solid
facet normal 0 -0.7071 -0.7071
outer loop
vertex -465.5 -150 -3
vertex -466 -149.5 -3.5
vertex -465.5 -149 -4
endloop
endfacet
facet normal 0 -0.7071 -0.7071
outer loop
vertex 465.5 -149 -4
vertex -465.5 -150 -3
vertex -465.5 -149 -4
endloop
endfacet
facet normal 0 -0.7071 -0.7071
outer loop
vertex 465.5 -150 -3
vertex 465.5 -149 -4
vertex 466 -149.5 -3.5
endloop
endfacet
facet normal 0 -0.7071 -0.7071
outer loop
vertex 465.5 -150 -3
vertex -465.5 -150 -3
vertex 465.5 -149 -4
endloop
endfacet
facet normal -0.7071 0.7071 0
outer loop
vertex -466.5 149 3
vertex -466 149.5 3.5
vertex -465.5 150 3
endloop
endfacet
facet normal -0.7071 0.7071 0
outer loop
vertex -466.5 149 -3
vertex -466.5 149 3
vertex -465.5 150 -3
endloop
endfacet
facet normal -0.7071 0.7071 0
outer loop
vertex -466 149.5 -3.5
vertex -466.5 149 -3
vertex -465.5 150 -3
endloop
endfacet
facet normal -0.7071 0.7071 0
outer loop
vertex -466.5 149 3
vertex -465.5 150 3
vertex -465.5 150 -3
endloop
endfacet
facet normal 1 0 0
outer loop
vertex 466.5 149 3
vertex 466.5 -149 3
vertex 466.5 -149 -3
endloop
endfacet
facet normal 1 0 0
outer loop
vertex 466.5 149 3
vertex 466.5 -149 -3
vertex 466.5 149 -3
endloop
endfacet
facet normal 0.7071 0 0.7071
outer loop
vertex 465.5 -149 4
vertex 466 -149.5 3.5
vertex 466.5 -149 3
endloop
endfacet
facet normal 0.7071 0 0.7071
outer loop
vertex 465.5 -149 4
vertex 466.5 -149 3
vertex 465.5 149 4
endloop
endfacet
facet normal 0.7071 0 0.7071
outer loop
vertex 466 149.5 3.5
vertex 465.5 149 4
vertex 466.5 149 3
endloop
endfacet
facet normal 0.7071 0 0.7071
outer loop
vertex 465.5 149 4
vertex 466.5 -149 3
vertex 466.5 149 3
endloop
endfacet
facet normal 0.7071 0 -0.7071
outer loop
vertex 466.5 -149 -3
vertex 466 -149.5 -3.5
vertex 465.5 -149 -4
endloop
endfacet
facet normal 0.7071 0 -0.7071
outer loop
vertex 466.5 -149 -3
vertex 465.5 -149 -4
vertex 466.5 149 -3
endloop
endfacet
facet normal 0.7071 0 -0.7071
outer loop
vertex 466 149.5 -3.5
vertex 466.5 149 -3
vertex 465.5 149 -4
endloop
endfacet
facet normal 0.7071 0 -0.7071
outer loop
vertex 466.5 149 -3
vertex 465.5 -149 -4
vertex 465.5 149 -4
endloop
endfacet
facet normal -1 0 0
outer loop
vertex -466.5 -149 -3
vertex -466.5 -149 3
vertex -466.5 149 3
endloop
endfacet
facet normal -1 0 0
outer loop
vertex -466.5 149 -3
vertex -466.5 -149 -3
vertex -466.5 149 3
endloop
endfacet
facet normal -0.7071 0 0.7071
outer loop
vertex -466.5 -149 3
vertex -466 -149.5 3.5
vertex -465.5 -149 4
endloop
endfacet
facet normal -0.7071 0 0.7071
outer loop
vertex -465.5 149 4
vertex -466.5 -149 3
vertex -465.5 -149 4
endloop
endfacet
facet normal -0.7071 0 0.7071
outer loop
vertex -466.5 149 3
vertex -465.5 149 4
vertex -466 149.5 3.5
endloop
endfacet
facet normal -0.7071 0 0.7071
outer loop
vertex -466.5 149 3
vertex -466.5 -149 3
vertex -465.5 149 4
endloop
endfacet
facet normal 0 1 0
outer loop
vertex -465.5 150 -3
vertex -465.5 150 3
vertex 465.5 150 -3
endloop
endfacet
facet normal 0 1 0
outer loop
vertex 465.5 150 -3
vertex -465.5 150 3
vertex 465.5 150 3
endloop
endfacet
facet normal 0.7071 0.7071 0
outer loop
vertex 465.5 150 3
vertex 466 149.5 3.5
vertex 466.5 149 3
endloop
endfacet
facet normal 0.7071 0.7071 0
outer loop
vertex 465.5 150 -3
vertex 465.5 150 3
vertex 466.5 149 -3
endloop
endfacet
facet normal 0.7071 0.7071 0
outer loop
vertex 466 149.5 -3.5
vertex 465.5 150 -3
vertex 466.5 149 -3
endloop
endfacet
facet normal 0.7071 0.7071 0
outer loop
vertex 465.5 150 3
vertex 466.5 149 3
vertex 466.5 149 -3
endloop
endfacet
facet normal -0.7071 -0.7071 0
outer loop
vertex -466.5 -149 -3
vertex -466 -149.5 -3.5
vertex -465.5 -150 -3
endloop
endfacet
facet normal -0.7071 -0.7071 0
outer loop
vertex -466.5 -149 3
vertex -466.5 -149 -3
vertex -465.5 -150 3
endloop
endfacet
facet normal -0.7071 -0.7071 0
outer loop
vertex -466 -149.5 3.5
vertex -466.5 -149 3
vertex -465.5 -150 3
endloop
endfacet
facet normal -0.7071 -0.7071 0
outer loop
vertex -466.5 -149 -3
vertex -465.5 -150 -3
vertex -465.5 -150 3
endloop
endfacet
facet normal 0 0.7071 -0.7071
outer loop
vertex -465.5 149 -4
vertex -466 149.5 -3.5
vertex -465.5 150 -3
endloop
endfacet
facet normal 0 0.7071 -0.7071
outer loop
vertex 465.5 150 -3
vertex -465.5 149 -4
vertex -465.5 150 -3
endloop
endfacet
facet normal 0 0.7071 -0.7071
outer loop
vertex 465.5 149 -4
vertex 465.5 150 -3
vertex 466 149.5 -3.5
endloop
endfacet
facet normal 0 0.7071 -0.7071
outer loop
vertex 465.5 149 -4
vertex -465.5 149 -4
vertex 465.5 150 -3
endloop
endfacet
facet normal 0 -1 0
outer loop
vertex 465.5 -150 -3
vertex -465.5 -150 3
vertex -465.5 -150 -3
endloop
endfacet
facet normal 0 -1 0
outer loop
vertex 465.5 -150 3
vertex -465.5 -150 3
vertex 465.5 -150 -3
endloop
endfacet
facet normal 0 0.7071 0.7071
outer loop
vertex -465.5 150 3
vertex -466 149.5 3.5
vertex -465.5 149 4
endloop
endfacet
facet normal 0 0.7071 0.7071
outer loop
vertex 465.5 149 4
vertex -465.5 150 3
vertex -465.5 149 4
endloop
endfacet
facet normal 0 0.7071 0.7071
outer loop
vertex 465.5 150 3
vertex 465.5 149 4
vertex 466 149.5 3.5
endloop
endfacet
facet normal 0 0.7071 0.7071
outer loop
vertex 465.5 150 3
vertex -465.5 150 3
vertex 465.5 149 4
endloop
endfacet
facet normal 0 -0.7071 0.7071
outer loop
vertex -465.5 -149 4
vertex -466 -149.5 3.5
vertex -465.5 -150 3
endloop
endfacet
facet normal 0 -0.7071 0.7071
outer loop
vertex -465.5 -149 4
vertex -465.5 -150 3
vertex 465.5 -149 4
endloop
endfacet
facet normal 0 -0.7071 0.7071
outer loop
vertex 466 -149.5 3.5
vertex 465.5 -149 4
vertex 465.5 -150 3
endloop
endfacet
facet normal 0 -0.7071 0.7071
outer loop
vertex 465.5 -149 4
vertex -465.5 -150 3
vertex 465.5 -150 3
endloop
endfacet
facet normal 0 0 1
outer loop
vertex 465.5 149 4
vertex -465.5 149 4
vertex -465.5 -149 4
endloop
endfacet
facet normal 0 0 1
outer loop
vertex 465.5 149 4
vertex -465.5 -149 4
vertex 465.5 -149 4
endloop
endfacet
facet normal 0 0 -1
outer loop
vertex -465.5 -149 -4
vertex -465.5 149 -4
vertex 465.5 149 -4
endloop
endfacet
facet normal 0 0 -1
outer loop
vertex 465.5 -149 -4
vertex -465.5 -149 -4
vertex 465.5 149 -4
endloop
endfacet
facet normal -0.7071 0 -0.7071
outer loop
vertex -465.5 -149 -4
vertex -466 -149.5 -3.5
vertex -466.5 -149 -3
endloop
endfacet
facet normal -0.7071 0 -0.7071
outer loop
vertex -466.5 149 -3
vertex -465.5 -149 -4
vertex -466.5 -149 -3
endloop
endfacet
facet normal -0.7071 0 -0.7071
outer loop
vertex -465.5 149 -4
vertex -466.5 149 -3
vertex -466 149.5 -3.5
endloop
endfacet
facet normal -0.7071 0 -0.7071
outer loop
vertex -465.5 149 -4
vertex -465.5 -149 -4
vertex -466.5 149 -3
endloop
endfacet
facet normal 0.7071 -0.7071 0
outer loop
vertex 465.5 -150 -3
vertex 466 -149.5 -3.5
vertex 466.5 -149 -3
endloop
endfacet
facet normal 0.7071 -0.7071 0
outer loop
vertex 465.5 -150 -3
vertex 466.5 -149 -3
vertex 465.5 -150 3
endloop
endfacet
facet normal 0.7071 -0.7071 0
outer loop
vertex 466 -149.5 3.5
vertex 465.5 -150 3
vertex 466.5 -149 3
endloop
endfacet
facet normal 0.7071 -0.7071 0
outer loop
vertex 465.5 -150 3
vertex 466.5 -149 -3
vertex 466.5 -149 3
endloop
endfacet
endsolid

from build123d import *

# Parameters (mm, degrees)
F0_W     = 933
F0_H     = 300
F1_DEPTH = 4
F2_SIZE  = 1
F3_SIZE  = 1
F4_SIZE  = 1
F5_SIZE  = 1
F6_SIZE  = 1
F7_SIZE  = 1


with BuildPart() as f1:
    # F0 (on Top) → F1 (new body, symmetric)
    with BuildSketch(Plane.XY):
        Rectangle(F0_W, F0_H)
    extrude(amount=F1_DEPTH, both=True)

    # F2
    f2_edges = [f1.edges().sort_by_distance(p)[0] for p in [
        (466.5, 0, -4),
        (0, -150, -4),
        (-466.5, 0, -4),
        (0, 150, -4),
    ]]
    chamfer(f2_edges, length=F2_SIZE)

    # F3
    f3_edges = [f1.edges().sort_by_distance(p)[0] for p in [
        (466.5, -150, 0.5),
    ]]
    chamfer(f3_edges, length=F3_SIZE)

    # F4
    f4_edges = [f1.edges().sort_by_distance(p)[0] for p in [
        (-466.5, 150, 0.5),
    ]]
    chamfer(f4_edges, length=F4_SIZE)

    # F5
    f5_edges = [f1.edges().sort_by_distance(p)[0] for p in [
        (-466.5, -150, 0.5),
    ]]
    chamfer(f5_edges, length=F5_SIZE)

    # F6
    f6_edges = [f1.edges().sort_by_distance(p)[0] for p in [
        (466.5, 150, 0.5),
    ]]
    chamfer(f6_edges, length=F6_SIZE)

    # F7 (call 1 of 4: OpenCascade refuses the feature's edges together)
    f7_edges = [f1.edges().sort_by_distance(p)[0] for p in [
        (0, -150, 4),
    ]]
    chamfer(f7_edges, length=F7_SIZE)

    # F7#2 (call 2 of 4)
    f7_2_edges = [f1.edges().sort_by_distance(p)[0] for p in [
        (466.5, 0, 4),
    ]]
    chamfer(f7_2_edges, length=F7_SIZE)

    # F7#3 (call 3 of 4)
    f7_3_edges = [f1.edges().sort_by_distance(p)[0] for p in [
        (0, 150, 4),
    ]]
    chamfer(f7_3_edges, length=F7_SIZE)

    # F7#4 (call 4 of 4)
    f7_4_edges = [f1.edges().sort_by_distance(p)[0] for p in [
        (-466.5, 0, 4),
    ]]
    chamfer(f7_4_edges, length=F7_SIZE)


solid = f1.part
